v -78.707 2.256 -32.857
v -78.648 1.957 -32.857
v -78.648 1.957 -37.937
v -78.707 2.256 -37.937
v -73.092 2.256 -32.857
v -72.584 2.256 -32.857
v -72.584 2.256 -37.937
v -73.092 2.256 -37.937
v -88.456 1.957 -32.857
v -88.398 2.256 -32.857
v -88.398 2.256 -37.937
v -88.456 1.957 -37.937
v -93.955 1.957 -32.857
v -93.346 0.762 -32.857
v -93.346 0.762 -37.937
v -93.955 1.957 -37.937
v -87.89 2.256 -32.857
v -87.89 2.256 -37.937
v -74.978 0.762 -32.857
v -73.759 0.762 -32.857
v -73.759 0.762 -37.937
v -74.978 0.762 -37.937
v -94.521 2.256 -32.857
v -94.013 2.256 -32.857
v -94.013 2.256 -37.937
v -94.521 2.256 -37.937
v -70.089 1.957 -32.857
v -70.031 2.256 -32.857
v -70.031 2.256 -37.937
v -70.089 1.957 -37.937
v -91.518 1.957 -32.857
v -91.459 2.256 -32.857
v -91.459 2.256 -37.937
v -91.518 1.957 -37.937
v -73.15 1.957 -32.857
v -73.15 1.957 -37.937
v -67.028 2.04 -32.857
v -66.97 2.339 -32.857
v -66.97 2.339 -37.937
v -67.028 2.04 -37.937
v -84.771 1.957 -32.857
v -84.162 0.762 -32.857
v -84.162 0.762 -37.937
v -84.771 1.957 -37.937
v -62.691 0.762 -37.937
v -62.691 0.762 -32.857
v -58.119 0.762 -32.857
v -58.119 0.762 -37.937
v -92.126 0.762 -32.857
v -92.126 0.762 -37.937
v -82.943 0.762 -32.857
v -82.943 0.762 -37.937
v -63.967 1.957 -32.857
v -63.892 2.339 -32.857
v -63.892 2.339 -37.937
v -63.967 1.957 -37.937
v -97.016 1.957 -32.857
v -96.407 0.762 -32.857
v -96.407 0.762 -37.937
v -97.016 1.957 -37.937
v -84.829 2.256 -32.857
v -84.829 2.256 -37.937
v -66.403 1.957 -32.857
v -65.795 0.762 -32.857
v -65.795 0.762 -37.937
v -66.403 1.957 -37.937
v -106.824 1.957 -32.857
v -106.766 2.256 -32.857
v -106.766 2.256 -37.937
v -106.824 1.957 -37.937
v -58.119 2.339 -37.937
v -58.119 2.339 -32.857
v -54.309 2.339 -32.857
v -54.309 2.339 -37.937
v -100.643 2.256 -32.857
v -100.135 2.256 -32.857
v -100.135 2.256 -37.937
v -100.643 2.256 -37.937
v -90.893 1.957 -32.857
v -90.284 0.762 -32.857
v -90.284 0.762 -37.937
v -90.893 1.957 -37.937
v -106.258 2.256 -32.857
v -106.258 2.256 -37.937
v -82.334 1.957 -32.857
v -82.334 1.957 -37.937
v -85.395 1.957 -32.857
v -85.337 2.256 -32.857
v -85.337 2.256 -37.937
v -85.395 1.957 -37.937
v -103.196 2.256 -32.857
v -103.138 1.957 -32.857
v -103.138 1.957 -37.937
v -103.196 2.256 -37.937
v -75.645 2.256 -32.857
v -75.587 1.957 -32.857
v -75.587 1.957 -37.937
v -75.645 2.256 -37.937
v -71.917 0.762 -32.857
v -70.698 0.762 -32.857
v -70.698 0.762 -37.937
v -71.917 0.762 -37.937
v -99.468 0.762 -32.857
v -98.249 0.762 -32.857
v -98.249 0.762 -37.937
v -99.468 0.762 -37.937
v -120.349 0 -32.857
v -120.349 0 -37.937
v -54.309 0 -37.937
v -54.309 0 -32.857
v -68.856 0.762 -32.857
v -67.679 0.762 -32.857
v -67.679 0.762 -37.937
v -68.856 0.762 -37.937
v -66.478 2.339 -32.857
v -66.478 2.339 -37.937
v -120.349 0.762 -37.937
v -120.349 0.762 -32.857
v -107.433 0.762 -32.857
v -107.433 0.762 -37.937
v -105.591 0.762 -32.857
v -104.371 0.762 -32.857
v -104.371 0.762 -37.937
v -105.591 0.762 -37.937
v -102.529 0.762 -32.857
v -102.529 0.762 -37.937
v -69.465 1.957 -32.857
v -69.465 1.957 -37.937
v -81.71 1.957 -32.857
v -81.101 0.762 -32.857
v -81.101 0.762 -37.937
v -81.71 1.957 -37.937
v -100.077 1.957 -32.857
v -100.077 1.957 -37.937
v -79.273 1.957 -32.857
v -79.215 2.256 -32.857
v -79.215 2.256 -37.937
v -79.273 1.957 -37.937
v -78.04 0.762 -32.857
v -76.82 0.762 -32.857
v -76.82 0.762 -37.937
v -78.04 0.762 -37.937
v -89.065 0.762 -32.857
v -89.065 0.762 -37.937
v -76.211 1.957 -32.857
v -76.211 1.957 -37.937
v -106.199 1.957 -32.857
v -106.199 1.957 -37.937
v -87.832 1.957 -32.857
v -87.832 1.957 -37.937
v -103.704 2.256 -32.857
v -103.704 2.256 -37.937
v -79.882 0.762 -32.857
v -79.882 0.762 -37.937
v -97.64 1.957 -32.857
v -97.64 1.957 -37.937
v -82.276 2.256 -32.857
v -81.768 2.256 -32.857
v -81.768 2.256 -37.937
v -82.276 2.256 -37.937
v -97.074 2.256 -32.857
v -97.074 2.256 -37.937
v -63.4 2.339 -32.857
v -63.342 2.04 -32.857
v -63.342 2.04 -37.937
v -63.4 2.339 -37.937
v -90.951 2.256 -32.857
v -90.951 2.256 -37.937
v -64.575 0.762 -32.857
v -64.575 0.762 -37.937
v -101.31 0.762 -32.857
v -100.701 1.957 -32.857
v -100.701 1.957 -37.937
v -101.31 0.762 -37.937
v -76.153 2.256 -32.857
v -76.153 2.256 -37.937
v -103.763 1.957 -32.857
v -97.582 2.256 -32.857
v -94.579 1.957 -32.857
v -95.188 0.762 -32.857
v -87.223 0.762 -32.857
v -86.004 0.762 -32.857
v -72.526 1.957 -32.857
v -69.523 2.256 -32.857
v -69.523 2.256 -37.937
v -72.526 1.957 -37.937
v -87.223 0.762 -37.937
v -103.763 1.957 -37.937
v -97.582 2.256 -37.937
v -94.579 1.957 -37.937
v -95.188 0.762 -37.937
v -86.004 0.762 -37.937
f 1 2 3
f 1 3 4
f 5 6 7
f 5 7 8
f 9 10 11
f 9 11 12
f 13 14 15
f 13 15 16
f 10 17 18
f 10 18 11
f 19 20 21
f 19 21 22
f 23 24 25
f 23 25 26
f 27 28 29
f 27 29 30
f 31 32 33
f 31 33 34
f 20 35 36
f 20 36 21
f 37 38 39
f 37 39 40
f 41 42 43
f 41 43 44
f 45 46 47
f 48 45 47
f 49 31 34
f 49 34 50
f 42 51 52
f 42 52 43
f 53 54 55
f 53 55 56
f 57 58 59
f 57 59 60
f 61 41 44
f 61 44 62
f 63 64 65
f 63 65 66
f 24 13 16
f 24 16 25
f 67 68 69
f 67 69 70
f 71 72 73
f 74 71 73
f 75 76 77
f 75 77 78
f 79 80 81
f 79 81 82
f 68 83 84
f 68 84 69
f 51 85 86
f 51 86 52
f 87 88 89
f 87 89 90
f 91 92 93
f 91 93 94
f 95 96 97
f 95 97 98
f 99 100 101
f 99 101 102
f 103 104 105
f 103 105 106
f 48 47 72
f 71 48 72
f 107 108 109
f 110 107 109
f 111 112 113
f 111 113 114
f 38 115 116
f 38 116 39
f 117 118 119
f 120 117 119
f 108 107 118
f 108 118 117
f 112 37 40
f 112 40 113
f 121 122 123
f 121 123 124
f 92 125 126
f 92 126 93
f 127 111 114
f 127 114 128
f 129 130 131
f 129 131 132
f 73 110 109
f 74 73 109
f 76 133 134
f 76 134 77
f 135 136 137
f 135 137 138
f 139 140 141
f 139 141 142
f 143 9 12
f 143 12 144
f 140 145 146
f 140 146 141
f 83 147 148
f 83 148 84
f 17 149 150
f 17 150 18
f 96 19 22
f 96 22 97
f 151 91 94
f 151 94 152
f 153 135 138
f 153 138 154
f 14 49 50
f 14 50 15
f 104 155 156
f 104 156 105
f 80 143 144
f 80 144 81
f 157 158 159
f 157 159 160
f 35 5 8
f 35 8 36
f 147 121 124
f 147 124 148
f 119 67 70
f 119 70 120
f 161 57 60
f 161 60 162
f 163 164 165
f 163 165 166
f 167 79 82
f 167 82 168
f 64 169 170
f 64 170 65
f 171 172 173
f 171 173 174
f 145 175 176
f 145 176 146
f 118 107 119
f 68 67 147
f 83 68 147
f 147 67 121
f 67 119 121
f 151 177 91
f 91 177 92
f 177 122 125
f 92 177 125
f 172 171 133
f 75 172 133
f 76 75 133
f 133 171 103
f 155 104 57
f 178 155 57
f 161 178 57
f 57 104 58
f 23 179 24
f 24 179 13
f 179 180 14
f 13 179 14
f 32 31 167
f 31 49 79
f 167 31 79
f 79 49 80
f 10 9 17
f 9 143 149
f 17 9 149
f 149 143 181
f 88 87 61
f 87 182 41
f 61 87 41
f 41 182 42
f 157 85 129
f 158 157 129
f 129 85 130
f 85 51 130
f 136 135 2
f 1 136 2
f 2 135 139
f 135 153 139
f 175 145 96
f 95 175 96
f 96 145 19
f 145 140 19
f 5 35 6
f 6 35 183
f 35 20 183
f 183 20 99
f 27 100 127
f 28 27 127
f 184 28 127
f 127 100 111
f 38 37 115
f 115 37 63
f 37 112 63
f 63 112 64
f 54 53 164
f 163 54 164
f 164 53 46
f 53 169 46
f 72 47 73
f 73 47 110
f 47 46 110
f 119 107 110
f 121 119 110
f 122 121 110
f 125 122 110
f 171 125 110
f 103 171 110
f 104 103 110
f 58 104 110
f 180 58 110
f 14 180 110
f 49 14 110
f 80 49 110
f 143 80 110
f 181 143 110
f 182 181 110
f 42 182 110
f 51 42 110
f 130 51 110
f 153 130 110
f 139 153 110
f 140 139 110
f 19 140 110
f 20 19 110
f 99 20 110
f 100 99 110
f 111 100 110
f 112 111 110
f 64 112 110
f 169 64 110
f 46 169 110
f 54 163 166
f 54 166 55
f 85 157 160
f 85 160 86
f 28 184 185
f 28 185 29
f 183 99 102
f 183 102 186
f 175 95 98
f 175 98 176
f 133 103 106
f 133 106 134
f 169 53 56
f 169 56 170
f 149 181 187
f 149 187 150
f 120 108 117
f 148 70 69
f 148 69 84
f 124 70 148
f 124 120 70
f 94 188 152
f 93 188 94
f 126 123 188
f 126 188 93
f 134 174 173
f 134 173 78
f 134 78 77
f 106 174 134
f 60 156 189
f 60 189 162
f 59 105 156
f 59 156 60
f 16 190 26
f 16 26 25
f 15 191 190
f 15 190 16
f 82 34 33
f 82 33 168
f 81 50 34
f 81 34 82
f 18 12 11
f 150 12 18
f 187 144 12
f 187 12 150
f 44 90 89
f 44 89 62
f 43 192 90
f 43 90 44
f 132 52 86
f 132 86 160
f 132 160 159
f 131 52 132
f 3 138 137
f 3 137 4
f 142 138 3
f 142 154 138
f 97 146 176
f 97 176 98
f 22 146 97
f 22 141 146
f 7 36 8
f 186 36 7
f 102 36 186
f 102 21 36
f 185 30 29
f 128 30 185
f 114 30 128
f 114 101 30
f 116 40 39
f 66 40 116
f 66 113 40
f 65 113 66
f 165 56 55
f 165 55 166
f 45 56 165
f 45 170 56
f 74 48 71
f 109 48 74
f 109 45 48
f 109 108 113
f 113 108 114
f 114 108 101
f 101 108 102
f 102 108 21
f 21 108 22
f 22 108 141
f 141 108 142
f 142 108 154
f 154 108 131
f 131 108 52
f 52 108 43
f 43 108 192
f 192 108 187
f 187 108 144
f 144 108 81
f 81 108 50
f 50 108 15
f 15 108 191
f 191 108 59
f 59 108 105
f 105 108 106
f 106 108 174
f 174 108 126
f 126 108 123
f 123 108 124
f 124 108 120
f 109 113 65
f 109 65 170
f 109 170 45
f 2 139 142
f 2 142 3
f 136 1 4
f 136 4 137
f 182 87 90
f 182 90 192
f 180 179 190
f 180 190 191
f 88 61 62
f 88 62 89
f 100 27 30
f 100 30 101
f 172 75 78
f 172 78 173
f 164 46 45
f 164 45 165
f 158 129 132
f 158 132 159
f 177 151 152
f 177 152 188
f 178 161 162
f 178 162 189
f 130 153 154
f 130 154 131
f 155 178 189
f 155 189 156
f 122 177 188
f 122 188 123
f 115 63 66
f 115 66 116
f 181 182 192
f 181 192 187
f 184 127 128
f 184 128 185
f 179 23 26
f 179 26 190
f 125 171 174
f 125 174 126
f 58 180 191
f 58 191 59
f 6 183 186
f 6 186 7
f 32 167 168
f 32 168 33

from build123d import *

# Parameters (mm, degrees)
SKETCH1_W           = 66.04
SKETCH1_H           = 5.08
BOSS_EXTRUDE1_DEPTH = 3.81
SKETCH2_W           = 4.572
SKETCH2_H           = 3.048
CUT_EXTRUDE1_DEPTH  = 6.08
CHAMFER1_SIZE       = 0.254
CUT_EXTRUDE2_DEPTH  = 6.08
SKETCH5_W           = 12.916630293
SKETCH5_H           = 3.048
CUT_EXTRUDE3_DEPTH  = 6.08
SKETCH6_W           = 3.81
SKETCH6_H           = 1.726747829
CUT_EXTRUDE4_DEPTH  = 6.08


with BuildPart() as part:
    # Sketch1 → Boss-Extrude1 (new body)
    with BuildSketch(Plane(origin=(0, 0, 0), x_dir=(1, 0, 0), z_dir=(0, 1, 0))):
        with Locations((-87.329253942, 35.396987703)):
            Rectangle(SKETCH1_W, SKETCH1_H)
    extrude(amount=BOSS_EXTRUDE1_DEPTH)

    # Sketch2 → Cut-Extrude1 (cut, through all)
    with BuildSketch(Plane.XY.offset(-32.856987703)):
        with Locations((-60.405253942, 2.286)):
            Rectangle(SKETCH2_W, SKETCH2_H)
    extrude(amount=-CUT_EXTRUDE1_DEPTH, mode=Mode.SUBTRACT)

    # Chamfer1
    chamfer1_edges = [part.edges().sort_by_distance(p)[0] for p in [
        (-54.309253942, 3.81, -35.396987703),
        (-58.119253942, 3.81, -35.396987703),
    ]]
    chamfer(chamfer1_edges, length=CHAMFER1_SIZE)

    # Sketch4 → Cut-Extrude2 (cut, through all)
    with BuildSketch(Plane.XY.offset(-32.856987703)):
        Polygon((-64.575422666, 0.762), (-65.794622666, 0.762), (-66.403478406, 1.95694667), (-66.477713127, 2.338851205), (-66.969636987, 2.338851205), (-67.027795569, 2.03965124), (-67.678791391, 0.762), (-68.855851308, 0.762), (-69.464707047, 1.95694667), (-69.522865629, 2.256146635), (-70.030865629, 2.256146635), (-70.089024211, 1.95694667), (-70.69787995, 0.762), (-71.91707995, 0.762), (-72.525935689, 1.95694667), (-72.584094271, 2.256146635), (-73.092094271, 2.256146635), (-73.150252852, 1.95694667), (-73.759108591, 0.762), (-74.978308591, 0.762), (-75.58716433, 1.95694667), (-75.645322912, 2.256146635), (-76.153322912, 2.256146635), (-76.211481494, 1.95694667), (-76.820337233, 0.762), (-78.039537233, 0.762), (-78.648392972, 1.95694667), (-78.706551554, 2.256146635), (-79.214551554, 2.256146635), (-79.272710136, 1.95694667), (-79.881565875, 0.762), (-81.100765875, 0.762), (-81.709621614, 1.95694667), (-81.767780195, 2.256146635), (-82.275780195, 2.256146635), (-82.333938777, 1.95694667), (-82.942794516, 0.762), (-84.161994516, 0.762), (-84.770850255, 1.95694667), (-84.829008837, 2.256146635), (-85.337008837, 2.256146635), (-85.395167419, 1.95694667), (-86.004023158, 0.762), (-87.223223158, 0.762), (-87.832078897, 1.95694667), (-87.890237479, 2.256146635), (-88.398237479, 2.256146635), (-88.45639606, 1.95694667), (-89.065251799, 0.762), (-90.284451799, 0.762), (-90.893307538, 1.95694667), (-90.95146612, 2.256146635), (-91.45946612, 2.256146635), (-91.517624702, 1.95694667), (-92.126480441, 0.762), (-93.345680441, 0.762), (-93.95453618, 1.95694667), (-94.012694762, 2.256146635), (-94.520694762, 2.256146635), (-94.578853344, 1.95694667), (-95.187709083, 0.762), (-96.406909083, 0.762), (-97.015764822, 1.95694667), (-97.073923403, 2.256146635), (-97.581923403, 2.256146635), (-97.640081985, 1.95694667), (-98.248937724, 0.762), (-99.468137724, 0.762), (-100.076993463, 1.95694667), (-100.135152045, 2.256146635), (-100.643152045, 2.256146635), (-100.701310627, 1.95694667), (-101.310166366, 0.762), (-102.529366366, 0.762), (-103.138222105, 1.95694667), (-103.196380687, 2.256146635), (-103.704380687, 2.256146635), (-103.762539268, 1.95694667), (-104.371395007, 0.762), (-105.590595007, 0.762), (-106.199450746, 1.95694667), (-106.257609328, 2.256146635), (-106.765609328, 2.256146635), (-106.82376791, 1.95694667), (-107.432623649, 0.762), (-107.432623649, 3.81), (-106.257609328, 3.81), (-62.691253942, 3.81), (-62.691253942, 0.762), (-63.342249764, 2.03965124), (-63.400408346, 2.338851205), (-63.892332206, 2.338851205), (-63.966566927, 1.95694667), align=None)
    extrude(amount=-CUT_EXTRUDE2_DEPTH, mode=Mode.SUBTRACT)

    # Sketch5 → Cut-Extrude3 (cut, through all)
    with BuildSketch(Plane.XY.offset(-32.856987703)):
        with Locations((-113.890938796, 2.286)):
            Rectangle(SKETCH5_W, SKETCH5_H)
    extrude(amount=-CUT_EXTRUDE3_DEPTH, mode=Mode.SUBTRACT)

    # Sketch6 → Cut-Extrude4 (cut, through all)
    with BuildSketch(Plane.XY.offset(-32.856987703)):
        with Locations((-56.214253942, 3.202225119)):
            Rectangle(SKETCH6_W, SKETCH6_H)
    extrude(amount=-CUT_EXTRUDE4_DEPTH, mode=Mode.SUBTRACT)


solid = part.part
